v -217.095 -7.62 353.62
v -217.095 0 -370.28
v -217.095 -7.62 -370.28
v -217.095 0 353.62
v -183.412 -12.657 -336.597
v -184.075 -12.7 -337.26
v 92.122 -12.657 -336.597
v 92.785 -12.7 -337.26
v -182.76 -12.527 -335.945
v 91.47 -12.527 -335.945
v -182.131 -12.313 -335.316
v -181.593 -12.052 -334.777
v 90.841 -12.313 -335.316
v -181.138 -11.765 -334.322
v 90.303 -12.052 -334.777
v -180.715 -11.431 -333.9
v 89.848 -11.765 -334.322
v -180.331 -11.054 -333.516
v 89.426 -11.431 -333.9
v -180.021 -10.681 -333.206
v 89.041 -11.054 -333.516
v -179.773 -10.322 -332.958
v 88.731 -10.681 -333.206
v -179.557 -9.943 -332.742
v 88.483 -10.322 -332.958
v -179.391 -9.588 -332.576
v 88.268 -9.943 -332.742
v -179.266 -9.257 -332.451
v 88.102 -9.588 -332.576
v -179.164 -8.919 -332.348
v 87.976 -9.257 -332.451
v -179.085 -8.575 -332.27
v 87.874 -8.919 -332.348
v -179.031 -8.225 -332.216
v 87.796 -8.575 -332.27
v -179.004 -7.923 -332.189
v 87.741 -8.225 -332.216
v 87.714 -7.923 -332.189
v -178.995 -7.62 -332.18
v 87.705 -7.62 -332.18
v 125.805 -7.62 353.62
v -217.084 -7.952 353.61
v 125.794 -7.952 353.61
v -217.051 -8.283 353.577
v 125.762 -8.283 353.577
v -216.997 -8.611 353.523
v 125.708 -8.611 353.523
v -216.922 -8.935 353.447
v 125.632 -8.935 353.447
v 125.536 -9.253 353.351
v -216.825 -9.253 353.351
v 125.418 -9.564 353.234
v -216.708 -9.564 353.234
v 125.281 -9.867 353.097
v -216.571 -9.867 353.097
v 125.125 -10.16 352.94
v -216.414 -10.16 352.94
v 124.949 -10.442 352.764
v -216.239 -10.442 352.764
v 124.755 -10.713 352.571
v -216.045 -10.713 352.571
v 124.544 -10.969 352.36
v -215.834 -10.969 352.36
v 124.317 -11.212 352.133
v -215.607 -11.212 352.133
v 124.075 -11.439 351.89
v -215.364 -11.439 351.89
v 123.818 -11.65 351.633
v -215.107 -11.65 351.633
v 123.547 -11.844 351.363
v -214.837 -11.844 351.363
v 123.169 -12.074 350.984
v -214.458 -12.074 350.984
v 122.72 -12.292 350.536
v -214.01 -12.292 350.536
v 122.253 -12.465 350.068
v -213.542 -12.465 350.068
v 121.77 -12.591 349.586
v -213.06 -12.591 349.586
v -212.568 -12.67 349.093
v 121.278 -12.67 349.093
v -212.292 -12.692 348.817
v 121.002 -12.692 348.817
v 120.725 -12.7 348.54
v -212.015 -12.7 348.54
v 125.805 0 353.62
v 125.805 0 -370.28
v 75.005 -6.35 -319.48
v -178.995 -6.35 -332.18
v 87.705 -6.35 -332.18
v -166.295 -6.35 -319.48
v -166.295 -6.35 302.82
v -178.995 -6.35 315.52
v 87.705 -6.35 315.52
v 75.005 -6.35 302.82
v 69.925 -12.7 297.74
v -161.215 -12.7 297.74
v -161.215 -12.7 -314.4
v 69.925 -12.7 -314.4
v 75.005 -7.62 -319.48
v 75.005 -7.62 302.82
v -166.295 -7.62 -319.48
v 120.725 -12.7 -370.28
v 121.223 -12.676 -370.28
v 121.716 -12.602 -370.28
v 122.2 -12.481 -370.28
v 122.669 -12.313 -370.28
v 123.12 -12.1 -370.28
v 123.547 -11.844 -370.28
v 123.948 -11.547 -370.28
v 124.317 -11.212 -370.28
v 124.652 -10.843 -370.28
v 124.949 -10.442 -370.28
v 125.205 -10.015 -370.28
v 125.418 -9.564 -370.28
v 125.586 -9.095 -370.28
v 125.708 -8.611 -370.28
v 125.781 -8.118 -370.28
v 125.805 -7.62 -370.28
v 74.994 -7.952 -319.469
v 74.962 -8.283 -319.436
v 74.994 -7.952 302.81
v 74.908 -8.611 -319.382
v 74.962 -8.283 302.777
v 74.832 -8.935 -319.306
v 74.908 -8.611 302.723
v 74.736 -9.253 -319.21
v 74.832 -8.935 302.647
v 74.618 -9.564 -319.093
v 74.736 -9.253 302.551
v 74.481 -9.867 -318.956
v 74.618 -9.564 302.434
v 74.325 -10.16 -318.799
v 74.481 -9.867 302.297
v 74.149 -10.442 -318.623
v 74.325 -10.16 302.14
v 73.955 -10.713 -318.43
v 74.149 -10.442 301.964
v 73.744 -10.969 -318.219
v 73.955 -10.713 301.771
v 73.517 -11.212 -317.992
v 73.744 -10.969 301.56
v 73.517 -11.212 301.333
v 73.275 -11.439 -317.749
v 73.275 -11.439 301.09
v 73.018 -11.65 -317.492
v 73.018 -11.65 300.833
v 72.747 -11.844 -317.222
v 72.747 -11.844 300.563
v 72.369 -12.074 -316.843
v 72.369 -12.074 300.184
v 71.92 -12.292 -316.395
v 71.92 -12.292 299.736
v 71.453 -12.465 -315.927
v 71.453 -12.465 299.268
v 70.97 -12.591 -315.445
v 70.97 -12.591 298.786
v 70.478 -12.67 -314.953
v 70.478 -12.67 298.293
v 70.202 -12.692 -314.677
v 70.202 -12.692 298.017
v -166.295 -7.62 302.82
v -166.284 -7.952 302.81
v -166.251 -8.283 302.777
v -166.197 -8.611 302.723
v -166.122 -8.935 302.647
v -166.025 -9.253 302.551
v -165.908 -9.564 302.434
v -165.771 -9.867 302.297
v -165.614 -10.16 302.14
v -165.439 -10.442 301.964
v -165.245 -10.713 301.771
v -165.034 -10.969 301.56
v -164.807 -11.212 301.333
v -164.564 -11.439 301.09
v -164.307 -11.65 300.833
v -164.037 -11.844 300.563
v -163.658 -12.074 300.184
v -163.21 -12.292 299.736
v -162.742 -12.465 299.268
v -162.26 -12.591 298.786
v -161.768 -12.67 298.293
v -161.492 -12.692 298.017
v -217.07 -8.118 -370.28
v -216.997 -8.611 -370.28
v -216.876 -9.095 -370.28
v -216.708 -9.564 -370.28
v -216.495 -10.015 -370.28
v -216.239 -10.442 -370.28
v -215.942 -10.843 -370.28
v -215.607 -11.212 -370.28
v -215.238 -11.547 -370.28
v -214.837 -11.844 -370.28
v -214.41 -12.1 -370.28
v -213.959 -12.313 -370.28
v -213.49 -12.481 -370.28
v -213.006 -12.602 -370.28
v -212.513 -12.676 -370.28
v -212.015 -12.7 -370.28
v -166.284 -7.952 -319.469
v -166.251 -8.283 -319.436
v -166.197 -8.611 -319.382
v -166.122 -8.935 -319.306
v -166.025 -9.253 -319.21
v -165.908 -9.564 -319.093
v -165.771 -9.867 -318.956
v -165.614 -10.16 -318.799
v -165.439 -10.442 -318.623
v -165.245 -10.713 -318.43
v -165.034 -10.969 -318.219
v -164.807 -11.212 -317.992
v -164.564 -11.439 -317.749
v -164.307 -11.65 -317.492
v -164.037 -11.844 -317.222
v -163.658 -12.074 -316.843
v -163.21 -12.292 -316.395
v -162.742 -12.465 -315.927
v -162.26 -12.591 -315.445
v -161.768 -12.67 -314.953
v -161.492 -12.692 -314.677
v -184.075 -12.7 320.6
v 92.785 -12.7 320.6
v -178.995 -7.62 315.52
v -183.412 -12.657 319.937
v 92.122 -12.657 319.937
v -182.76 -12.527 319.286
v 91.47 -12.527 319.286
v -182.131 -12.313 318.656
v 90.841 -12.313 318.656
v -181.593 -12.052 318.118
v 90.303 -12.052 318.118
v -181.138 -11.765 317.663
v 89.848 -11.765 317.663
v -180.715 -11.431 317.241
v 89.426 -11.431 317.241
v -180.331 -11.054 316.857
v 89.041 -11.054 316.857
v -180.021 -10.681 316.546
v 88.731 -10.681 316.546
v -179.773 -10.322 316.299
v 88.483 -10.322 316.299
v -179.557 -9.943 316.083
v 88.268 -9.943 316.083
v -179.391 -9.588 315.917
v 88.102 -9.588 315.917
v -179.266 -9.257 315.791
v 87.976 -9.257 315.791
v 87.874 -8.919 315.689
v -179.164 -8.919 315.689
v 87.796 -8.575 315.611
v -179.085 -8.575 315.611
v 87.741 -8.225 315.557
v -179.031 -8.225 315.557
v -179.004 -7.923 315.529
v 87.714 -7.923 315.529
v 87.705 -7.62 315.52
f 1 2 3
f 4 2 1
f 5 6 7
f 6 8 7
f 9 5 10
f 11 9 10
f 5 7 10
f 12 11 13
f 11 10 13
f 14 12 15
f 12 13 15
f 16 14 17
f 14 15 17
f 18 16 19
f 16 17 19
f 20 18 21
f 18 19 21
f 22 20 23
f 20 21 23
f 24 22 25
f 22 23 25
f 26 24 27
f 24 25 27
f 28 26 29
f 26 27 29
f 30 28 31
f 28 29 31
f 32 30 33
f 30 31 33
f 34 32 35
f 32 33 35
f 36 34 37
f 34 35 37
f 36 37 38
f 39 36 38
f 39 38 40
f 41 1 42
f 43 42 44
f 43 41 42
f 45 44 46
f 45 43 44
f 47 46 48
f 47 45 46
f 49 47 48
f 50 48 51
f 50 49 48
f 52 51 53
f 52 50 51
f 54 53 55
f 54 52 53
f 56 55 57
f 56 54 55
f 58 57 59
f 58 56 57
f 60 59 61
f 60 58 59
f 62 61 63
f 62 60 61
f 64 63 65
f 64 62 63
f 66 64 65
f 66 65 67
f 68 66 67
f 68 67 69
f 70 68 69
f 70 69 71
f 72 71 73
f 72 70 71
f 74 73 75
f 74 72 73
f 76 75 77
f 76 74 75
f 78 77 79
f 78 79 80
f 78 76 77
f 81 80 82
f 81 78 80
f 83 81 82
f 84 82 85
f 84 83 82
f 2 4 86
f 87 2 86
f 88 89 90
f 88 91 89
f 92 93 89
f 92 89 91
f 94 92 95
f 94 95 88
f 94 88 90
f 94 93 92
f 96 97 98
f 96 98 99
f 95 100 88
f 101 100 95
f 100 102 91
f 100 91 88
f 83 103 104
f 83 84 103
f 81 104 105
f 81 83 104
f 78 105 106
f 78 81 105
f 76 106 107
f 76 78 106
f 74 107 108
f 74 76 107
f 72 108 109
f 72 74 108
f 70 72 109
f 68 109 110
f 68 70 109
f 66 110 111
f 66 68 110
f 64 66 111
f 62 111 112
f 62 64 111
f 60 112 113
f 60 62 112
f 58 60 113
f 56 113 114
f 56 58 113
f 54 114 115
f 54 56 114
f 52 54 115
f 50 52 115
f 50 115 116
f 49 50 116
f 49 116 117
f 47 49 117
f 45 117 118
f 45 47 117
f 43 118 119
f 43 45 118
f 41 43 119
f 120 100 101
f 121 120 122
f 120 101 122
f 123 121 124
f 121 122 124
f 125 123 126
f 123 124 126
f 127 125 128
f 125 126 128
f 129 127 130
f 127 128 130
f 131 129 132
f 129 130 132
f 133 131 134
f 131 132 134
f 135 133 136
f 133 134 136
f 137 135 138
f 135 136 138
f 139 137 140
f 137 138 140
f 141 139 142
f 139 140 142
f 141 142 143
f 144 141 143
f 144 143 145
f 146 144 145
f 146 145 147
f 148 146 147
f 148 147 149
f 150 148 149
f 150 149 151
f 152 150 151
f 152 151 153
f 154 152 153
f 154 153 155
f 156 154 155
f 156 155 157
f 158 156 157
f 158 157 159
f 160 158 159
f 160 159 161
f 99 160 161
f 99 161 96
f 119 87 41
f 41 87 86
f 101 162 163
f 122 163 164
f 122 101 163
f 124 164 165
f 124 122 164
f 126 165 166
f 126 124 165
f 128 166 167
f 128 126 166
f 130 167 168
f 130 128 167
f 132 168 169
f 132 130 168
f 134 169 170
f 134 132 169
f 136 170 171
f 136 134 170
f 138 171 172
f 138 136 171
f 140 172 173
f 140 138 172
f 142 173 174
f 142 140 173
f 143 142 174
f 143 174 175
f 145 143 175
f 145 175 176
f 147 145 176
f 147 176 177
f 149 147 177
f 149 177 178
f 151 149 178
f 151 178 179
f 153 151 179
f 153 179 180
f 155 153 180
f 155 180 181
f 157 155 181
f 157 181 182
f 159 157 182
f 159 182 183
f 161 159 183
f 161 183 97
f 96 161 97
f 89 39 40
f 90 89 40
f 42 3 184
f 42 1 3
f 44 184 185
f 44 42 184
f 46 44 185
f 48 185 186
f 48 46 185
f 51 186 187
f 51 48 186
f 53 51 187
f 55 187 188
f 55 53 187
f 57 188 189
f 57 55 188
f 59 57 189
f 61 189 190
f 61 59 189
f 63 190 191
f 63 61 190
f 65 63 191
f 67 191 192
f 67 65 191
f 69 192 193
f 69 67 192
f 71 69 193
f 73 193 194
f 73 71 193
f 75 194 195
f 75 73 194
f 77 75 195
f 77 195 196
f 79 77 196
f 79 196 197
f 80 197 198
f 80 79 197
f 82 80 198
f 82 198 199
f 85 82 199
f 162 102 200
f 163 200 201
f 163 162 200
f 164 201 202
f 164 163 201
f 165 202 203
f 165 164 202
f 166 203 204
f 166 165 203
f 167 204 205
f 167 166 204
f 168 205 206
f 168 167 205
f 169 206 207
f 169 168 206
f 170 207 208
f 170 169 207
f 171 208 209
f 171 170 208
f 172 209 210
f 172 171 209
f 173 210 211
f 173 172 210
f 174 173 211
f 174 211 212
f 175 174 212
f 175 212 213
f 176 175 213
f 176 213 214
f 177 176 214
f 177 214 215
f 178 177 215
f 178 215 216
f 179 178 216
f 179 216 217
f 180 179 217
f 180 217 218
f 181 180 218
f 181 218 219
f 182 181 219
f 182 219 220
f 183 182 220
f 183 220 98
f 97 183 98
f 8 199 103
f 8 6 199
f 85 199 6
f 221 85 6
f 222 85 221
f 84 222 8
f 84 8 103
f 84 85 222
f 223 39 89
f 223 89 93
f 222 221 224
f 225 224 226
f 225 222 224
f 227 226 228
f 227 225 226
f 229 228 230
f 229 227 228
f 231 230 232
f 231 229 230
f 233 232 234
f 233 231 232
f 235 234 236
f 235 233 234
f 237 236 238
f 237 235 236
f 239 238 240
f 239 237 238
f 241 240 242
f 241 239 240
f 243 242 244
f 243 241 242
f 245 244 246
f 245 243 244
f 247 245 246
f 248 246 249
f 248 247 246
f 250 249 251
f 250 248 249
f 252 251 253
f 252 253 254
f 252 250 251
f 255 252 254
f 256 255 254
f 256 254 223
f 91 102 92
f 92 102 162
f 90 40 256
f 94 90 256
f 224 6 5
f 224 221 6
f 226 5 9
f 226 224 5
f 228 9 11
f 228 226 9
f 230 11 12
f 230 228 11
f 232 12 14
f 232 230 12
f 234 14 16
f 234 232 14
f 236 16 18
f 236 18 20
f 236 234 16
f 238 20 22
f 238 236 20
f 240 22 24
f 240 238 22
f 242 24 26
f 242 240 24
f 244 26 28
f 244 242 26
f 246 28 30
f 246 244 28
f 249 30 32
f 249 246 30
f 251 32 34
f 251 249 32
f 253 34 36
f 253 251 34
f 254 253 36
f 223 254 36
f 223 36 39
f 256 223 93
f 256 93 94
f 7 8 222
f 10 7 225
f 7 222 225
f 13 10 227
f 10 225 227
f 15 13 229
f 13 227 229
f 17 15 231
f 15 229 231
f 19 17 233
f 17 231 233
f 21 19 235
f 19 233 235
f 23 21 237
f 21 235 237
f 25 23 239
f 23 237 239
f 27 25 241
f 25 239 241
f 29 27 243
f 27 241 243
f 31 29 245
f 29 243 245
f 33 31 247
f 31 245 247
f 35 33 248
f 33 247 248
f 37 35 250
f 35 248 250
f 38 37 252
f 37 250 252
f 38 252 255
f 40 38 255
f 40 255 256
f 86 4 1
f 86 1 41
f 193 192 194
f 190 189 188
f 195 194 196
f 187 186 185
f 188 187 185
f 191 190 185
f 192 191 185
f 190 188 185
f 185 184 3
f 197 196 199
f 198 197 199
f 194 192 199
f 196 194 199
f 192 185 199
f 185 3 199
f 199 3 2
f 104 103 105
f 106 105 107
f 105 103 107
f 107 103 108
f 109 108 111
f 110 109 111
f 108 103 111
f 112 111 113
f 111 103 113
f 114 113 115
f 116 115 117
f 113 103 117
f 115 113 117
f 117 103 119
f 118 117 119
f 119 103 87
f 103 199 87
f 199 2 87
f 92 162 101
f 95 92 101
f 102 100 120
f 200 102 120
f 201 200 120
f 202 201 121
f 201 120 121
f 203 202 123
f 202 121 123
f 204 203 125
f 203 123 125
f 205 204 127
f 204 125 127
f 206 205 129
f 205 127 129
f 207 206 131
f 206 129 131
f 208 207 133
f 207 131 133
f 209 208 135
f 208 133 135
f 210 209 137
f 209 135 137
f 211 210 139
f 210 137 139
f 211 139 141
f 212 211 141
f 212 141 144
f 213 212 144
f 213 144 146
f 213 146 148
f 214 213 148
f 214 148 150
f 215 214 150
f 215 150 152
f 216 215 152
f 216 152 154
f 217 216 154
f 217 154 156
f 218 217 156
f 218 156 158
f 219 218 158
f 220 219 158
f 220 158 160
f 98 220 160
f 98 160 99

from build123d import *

# Parameters (mm, degrees)
F0_W     = 342.9
F0_H     = 723.9
F1_DEPTH = 12.7
F2_W     = 266.7
F2_H     = 647.7
F2_W_2   = 241.3
F2_H_2   = 622.3
F3_DEPTH = 6.35
F4_R     = 5.08


with BuildPart() as f1:
    # F0 (on Front) → F1 (new body)
    with BuildSketch(Plane.XZ):
        with Locations((-45.644873, -8.329587)):
            Rectangle(F0_W, F0_H)
    extrude(amount=F1_DEPTH)

    # F2 (on face) → F3 (cut)
    with BuildSketch(Plane.XZ.offset(12.7)):
        with Locations((-45.644873, -8.329587)):
            Rectangle(F2_W, F2_H)
        with Locations((-45.644873, -8.329587)):
            Rectangle(F2_W_2, F2_H_2, mode=Mode.SUBTRACT)
    extrude(amount=-F3_DEPTH, mode=Mode.SUBTRACT)

    # F4
    f4_edges = [f1.edges().sort_by_distance(p)[0] for p in [
        (-217.094873, -12.7, -8.329587),
        (-45.644873, -12.7, 353.620413),
        (125.805127, -12.7, -8.329587),
        (87.705127, -12.7, -8.329587),
        (-45.644873, -12.7, 315.520413),
        (-178.994873, -12.7, -8.329587),
        (-166.294873, -12.7, -8.329587),
        (-45.644873, -12.7, 302.820413),
        (75.005127, -12.7, -8.329587),
        (-45.644873, -12.7, -319.479587),
        (-45.644873, -12.7, -332.179587),
    ]]
    fillet(f4_edges, radius=F4_R)


solid = f1.part
